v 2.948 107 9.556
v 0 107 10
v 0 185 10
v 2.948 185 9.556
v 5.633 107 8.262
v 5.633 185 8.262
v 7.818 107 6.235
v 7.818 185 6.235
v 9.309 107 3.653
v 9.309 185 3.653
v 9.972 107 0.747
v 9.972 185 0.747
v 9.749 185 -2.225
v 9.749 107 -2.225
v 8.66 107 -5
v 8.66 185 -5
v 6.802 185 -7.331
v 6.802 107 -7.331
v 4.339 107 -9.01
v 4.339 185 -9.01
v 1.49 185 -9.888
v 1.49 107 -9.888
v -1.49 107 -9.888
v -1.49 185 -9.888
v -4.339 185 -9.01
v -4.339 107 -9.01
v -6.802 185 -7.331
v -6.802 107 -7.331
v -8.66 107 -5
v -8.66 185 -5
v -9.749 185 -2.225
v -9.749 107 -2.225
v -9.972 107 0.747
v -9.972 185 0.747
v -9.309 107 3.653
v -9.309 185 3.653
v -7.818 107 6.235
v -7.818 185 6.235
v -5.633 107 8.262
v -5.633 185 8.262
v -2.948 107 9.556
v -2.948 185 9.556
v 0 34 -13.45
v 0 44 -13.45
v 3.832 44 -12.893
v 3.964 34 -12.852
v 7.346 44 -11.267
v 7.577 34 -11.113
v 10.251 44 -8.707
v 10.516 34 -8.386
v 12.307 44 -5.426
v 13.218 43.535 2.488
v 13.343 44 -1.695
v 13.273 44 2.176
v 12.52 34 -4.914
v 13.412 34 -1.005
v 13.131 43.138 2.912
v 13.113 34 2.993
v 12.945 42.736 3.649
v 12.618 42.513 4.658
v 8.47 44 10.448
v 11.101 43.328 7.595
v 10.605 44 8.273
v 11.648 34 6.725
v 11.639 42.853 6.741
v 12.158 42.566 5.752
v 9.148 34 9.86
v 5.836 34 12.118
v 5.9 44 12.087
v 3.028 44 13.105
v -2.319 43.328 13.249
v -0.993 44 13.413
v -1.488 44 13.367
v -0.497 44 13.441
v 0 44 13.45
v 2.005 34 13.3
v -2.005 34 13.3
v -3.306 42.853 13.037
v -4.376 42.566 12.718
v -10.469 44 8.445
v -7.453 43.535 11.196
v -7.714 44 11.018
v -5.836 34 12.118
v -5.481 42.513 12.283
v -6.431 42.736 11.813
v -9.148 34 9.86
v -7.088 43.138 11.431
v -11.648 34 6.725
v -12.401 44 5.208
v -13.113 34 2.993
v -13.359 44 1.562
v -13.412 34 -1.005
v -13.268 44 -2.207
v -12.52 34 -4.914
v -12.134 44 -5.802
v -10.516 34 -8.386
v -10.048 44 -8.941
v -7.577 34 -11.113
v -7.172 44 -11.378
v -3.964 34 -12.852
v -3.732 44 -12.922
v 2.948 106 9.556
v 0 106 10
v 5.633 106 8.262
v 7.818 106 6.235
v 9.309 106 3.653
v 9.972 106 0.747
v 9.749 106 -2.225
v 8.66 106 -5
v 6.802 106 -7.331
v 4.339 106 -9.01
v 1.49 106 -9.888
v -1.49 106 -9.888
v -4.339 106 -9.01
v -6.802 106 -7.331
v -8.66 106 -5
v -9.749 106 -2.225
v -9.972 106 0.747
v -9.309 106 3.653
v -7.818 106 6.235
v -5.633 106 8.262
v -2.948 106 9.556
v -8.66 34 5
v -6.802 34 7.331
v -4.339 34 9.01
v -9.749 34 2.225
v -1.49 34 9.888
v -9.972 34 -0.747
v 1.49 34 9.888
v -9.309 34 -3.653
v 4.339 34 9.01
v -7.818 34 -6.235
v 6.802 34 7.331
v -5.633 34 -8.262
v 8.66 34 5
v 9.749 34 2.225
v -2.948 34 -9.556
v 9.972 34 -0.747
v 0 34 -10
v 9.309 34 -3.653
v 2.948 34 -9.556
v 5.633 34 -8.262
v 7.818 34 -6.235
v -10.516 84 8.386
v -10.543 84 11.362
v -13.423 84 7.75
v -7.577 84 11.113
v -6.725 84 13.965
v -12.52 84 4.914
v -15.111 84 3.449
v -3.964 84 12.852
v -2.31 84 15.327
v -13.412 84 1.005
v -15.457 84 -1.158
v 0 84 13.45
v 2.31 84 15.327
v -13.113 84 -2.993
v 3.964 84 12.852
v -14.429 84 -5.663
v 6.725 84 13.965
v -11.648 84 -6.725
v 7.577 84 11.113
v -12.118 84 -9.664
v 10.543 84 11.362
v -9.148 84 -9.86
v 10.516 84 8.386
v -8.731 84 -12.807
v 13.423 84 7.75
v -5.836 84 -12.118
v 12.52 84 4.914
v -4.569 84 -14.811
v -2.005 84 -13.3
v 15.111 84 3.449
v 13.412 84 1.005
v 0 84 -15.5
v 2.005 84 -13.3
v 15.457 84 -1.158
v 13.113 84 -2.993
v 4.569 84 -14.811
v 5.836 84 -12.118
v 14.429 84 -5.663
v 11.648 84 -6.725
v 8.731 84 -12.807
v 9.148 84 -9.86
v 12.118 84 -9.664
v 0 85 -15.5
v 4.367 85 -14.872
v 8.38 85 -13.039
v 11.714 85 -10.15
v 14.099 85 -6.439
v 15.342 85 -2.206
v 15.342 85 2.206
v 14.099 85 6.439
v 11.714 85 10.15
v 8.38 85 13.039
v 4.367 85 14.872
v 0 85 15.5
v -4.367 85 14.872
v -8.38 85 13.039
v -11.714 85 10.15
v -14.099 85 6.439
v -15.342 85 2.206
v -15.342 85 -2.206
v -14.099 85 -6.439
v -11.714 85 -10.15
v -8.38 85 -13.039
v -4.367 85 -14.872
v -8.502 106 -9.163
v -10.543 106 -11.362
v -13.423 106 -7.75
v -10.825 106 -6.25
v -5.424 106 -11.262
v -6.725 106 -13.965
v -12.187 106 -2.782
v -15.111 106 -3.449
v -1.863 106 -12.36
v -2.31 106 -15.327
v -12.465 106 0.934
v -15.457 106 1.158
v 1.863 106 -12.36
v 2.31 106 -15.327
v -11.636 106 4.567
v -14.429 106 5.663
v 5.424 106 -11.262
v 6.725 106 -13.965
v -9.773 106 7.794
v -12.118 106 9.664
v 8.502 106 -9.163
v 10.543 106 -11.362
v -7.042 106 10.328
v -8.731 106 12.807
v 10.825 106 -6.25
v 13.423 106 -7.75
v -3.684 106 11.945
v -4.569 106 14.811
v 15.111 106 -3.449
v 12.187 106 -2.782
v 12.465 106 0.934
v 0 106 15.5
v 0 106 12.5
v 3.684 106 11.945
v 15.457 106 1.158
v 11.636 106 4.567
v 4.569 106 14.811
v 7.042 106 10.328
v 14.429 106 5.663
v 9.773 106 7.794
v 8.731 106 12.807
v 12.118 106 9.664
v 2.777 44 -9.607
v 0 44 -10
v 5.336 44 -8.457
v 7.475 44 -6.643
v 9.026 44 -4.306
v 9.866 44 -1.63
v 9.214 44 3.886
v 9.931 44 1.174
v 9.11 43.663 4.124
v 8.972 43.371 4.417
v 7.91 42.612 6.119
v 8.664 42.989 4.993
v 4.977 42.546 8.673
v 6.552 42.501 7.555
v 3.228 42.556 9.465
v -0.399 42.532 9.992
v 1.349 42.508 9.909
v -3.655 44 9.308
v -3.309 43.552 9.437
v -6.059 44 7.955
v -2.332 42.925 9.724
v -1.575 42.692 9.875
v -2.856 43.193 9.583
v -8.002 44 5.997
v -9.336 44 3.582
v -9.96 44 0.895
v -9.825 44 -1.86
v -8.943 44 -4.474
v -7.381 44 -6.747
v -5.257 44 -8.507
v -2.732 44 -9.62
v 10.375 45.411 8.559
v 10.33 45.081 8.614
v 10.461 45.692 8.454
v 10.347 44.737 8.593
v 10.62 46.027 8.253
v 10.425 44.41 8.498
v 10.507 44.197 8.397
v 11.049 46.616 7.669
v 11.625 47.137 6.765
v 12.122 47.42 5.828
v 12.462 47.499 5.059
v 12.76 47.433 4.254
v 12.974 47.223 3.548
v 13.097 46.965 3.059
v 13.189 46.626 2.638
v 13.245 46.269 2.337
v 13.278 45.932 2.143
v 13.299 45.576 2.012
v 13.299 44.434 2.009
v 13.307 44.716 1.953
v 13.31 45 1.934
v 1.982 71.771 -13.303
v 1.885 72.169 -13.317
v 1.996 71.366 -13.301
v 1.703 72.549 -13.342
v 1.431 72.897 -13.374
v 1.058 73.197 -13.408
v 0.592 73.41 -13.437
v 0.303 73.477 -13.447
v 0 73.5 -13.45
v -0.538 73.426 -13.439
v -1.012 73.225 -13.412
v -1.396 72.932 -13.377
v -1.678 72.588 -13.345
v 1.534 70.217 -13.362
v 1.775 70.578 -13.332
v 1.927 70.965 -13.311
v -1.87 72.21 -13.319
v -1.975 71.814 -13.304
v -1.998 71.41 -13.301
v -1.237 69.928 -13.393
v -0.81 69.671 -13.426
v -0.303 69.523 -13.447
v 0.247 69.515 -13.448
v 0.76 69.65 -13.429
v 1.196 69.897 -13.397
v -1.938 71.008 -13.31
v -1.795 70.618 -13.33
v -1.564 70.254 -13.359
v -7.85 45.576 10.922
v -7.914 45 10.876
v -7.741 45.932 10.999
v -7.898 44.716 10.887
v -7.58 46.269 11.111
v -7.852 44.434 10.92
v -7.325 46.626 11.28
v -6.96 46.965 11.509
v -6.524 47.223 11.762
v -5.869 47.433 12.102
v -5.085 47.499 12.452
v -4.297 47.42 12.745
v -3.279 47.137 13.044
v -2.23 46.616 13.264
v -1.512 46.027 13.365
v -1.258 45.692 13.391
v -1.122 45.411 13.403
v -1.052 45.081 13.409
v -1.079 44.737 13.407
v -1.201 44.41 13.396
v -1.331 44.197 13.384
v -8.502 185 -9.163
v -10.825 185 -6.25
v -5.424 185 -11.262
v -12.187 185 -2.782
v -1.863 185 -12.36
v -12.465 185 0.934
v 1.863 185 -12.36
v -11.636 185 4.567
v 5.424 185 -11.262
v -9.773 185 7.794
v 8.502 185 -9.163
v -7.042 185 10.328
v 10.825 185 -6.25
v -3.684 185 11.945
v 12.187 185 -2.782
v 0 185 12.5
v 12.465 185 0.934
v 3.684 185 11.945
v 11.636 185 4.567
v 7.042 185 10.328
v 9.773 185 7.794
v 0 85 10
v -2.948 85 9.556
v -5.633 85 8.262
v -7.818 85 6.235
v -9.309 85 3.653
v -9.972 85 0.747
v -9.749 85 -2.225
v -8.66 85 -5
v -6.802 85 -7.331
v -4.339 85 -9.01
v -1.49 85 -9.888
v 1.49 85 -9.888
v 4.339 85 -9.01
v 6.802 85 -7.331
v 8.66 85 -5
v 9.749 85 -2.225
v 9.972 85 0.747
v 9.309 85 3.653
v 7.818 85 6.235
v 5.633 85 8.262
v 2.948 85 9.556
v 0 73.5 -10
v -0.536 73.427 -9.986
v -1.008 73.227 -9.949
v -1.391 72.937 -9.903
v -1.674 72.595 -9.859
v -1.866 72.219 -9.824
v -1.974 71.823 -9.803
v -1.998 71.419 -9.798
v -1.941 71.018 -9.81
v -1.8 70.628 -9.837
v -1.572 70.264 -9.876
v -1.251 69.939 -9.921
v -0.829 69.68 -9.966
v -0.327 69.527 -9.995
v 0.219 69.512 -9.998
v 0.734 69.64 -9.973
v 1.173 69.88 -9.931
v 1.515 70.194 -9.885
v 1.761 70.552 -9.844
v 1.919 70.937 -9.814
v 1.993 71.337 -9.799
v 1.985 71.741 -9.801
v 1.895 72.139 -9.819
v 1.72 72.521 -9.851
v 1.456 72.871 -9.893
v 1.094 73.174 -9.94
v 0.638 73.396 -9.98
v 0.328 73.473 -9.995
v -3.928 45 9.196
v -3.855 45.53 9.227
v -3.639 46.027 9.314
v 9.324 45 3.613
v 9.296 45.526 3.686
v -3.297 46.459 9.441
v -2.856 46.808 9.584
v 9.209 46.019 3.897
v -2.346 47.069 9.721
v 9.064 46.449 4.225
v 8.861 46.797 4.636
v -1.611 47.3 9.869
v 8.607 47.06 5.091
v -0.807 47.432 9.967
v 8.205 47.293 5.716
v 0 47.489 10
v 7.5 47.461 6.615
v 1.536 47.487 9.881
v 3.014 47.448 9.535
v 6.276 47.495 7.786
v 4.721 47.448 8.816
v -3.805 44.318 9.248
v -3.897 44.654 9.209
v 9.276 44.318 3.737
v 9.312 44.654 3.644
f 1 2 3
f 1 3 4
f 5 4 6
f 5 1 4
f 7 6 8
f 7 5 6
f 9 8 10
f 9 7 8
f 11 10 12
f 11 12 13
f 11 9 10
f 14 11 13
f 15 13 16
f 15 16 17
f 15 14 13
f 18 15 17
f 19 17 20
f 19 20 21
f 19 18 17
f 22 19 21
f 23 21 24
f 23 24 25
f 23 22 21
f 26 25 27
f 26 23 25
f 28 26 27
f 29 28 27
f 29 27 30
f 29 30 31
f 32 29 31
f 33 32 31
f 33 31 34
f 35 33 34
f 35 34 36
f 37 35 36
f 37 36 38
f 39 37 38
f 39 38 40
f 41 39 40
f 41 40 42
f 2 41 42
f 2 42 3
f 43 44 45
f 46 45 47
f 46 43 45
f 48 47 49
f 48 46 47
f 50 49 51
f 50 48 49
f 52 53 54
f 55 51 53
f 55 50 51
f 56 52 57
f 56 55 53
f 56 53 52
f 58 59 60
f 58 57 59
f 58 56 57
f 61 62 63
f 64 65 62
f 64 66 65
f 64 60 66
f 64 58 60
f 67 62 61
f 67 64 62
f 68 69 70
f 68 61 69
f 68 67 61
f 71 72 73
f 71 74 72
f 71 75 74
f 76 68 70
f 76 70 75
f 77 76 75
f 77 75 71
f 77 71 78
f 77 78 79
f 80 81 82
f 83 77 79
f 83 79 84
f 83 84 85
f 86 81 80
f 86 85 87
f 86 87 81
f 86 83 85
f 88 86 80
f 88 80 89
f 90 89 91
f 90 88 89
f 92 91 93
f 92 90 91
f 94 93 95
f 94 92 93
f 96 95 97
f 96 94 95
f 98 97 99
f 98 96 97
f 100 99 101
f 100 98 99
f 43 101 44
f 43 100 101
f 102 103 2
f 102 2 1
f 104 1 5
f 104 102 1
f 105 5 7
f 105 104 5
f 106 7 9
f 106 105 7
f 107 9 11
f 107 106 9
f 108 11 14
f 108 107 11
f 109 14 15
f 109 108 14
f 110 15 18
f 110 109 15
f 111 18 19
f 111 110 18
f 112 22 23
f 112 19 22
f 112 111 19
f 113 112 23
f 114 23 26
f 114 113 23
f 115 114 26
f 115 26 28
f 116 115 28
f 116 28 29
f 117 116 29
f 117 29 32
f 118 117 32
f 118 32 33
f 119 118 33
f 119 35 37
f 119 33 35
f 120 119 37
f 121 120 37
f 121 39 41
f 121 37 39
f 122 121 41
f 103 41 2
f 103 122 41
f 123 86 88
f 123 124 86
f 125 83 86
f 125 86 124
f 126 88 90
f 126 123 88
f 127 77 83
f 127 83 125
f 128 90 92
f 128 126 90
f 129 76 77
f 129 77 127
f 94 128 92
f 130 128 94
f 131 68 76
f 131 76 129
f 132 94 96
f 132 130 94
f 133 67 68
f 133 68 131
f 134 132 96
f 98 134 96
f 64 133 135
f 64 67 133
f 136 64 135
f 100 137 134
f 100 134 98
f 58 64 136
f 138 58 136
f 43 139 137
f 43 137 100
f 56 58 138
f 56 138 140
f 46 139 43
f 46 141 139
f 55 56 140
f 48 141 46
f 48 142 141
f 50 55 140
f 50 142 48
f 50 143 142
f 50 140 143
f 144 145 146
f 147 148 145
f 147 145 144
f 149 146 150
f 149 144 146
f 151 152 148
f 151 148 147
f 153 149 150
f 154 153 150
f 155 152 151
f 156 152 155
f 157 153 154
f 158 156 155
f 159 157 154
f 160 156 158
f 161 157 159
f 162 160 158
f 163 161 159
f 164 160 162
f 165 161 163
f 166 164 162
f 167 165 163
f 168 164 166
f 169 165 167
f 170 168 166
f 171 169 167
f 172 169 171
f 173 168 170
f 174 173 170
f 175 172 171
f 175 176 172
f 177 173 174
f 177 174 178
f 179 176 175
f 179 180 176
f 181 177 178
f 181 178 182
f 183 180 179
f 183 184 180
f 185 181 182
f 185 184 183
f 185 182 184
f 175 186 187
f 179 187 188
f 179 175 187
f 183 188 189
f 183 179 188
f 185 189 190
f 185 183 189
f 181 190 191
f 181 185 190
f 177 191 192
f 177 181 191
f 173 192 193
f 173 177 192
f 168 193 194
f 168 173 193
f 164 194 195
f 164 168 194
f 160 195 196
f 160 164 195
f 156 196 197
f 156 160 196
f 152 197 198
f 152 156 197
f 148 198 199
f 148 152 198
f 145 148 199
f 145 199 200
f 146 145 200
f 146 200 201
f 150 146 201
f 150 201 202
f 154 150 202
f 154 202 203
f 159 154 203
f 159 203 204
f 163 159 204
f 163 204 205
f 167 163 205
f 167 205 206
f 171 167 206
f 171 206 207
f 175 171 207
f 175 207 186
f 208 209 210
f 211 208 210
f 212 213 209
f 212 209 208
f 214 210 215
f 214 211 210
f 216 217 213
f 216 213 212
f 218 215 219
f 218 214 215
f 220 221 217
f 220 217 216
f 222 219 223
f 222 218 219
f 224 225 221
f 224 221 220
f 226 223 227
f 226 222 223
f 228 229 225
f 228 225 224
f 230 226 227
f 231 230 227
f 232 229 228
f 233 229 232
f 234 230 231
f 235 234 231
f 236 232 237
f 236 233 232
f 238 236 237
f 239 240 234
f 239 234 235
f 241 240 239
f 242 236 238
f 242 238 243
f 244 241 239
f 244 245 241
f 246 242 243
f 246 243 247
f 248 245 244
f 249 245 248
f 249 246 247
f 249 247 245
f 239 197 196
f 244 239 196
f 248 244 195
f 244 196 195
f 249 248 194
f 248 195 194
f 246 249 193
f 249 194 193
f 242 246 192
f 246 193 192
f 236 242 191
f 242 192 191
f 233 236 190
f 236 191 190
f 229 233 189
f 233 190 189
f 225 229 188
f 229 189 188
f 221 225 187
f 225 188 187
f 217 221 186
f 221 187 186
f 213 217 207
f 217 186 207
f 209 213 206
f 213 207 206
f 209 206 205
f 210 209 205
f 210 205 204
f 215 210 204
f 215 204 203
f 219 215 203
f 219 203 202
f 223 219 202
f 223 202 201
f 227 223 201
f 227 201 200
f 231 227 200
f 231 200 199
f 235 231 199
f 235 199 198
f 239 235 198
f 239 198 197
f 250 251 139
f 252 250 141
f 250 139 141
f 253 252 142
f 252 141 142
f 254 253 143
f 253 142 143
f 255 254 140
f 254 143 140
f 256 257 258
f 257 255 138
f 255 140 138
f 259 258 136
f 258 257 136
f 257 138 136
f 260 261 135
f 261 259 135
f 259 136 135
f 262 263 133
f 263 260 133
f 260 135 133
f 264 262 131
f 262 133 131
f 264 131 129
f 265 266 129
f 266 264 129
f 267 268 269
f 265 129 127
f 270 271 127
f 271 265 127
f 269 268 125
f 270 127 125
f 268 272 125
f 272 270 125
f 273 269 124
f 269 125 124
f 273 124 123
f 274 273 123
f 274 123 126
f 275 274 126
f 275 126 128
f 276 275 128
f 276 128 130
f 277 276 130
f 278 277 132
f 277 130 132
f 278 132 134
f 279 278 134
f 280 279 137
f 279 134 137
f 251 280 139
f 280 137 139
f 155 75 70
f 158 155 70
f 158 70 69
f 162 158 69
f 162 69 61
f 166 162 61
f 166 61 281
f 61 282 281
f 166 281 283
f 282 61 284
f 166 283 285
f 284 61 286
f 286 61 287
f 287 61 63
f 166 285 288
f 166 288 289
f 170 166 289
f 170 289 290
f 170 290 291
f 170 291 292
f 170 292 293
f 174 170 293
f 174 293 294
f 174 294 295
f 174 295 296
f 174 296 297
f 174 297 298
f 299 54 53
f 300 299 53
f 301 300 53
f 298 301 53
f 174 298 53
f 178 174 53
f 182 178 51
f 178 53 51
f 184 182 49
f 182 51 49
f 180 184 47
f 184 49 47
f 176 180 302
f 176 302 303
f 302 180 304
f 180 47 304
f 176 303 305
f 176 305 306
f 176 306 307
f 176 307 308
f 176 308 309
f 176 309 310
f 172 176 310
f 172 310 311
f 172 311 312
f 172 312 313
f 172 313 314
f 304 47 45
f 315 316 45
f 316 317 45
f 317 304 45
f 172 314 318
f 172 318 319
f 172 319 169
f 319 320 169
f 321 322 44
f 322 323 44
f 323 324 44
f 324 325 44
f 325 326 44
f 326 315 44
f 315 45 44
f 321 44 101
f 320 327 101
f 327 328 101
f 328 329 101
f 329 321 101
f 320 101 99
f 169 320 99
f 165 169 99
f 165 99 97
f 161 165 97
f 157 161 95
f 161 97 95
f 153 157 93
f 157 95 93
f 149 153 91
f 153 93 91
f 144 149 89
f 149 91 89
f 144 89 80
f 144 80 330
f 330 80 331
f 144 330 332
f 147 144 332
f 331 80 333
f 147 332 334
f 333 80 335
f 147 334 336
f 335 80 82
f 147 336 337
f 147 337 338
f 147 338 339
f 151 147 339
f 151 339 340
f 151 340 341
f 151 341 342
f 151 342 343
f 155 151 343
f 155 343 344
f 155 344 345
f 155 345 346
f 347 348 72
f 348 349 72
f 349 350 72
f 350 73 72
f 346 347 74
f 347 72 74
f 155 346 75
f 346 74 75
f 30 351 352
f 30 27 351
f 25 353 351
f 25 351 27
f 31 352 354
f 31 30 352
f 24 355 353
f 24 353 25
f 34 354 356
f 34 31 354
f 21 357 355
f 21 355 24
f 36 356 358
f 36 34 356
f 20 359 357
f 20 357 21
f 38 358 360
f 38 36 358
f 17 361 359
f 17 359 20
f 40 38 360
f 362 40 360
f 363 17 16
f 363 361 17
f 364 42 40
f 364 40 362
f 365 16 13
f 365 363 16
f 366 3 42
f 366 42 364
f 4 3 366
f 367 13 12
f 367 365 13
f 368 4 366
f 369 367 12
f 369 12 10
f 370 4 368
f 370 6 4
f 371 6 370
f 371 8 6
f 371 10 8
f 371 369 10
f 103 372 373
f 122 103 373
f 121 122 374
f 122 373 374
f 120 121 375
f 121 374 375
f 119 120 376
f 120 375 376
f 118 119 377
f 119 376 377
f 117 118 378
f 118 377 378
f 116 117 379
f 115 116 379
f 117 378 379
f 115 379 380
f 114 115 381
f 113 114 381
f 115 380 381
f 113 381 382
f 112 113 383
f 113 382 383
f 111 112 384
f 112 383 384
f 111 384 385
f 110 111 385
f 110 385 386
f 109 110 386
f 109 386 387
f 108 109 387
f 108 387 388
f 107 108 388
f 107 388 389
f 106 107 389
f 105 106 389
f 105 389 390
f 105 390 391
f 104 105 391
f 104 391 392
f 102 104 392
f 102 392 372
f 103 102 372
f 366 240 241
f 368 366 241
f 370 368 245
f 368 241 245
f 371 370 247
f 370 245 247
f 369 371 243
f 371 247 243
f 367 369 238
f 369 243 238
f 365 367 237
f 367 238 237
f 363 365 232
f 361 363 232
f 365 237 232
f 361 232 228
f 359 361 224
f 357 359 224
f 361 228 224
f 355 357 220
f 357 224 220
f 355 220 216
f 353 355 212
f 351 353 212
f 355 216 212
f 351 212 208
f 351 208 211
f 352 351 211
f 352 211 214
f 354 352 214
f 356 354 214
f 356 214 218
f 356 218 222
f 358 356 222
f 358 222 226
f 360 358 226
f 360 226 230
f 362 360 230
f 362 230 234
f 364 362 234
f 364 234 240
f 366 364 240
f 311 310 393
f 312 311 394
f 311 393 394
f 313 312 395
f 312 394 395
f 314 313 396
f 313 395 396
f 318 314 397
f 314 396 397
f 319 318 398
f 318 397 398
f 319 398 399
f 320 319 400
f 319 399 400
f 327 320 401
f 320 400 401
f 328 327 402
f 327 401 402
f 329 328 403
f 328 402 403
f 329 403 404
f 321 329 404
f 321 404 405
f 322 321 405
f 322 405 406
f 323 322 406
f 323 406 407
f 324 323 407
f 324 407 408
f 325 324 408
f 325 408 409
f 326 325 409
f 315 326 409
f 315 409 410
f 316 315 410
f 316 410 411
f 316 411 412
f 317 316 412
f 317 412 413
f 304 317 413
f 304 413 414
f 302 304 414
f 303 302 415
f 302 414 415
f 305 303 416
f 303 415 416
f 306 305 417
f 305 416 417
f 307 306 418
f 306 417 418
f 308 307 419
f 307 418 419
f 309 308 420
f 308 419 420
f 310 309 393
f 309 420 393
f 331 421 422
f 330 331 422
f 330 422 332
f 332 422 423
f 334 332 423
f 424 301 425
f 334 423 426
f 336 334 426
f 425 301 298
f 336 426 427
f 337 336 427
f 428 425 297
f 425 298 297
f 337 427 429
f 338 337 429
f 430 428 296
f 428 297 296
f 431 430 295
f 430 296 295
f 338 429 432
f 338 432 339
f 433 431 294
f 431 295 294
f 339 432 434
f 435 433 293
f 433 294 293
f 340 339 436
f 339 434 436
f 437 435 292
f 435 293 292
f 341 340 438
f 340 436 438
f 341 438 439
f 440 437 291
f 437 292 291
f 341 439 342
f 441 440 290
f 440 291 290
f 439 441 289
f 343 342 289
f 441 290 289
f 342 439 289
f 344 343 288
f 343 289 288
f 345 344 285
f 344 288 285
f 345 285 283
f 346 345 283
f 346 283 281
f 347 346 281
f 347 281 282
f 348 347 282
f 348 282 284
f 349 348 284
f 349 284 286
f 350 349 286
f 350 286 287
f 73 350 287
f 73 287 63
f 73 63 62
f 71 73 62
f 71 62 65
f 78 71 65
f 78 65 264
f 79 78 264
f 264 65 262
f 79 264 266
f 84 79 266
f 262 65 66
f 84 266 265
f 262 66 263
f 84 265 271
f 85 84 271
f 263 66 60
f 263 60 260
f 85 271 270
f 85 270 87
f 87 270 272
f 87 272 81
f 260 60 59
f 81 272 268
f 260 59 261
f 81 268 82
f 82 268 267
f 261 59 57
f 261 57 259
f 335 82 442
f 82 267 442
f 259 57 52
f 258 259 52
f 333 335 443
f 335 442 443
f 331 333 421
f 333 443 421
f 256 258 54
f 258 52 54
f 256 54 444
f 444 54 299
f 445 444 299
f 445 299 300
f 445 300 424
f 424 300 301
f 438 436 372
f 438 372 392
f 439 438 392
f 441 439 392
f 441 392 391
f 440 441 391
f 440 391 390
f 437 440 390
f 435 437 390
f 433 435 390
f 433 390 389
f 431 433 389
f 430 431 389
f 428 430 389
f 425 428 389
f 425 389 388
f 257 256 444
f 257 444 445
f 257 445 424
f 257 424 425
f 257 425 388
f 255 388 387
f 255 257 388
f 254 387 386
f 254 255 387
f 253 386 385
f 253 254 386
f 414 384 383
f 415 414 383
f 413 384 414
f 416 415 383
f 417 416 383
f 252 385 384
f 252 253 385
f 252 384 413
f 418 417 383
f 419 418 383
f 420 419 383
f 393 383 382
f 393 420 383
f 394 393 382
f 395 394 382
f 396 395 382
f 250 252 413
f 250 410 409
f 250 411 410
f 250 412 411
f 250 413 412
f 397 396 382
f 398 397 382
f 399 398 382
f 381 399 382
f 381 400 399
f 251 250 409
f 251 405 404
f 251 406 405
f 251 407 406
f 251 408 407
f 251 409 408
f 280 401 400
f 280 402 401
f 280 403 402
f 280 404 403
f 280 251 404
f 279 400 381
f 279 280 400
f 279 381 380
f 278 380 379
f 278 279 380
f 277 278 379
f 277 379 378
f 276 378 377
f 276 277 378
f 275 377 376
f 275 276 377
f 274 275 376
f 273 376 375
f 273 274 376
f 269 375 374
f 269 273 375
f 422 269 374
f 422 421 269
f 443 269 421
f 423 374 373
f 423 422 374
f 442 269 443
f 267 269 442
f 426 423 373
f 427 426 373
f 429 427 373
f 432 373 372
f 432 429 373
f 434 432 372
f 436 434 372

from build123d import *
from build123d.topology import SkipClean

# Parameters (mm, degrees)
SKETCH1_R                = 13.45
SKETCH1_R_2              = 10
BOSS_EXTRUDE1_DEPTH      = 100
BOSS_EXTRUDE2_DEPTH      = 85
BOSS_EXTRUDE2_DEPTH_BACK = 4
SKETCH6_R                = 12.5
SKETCH6_R_2              = 10
BOSS_EXTRUDE3_START      = -84
SKETCH7_R                = 15.5
SKETCH7_R_2              = 10
BOSS_EXTRUDE3_DEPTH      = 1
CUT_EXTRUDE1_DEPTH       = 187.294122291
CUT_EXTRUDE1_DEPTH_BACK  = 187.294122291
SKETCH11_W               = 35.010034018
SKETCH11_H               = 2.4
CUT_EXTRUDE3_DEPTH       = 187.294122291
CUT_EXTRUDE3_DEPTH_BACK  = 187.294122291
SKETCH13_W               = 32.559051685
SKETCH13_H               = 42.8
SKETCH14_R               = 15.5
BOSS_EXTRUDE4_DEPTH      = 21
SKETCH15_R               = 10
CUT_EXTRUDE4_DEPTH       = 22
BOSS_EXTRUDE5_START      = 10
SKETCH17_R               = 13.45
SKETCH17_R_2             = 10
BOSS_EXTRUDE5_DEPTH      = 10
SKETCH18_R               = 2.5
CUT_EXTRUDE5_DEPTH       = 54
SKETCH20_R               = 2
CUT_EXTRUDE6_DEPTH       = 22


with BuildPart() as part:
    # Sketch1 → Boss-Extrude1 (new body)
    with BuildSketch(Plane(origin=(0, 0, 0), x_dir=(1, 0, 0), z_dir=(0, 1, 0))):
        with Locations(Location((0, 0, 0), (0, 0, 270))):
            Circle(SKETCH1_R)
        with Locations(Location((0, 0, 0), (0, 0, 270))):
            Circle(SKETCH1_R_2, mode=Mode.SUBTRACT)
    extrude(amount=BOSS_EXTRUDE1_DEPTH)

    # Sketch6 → Boss-Extrude2 (add, two sides: drawn at the far end of the back side and taken through both)
    with BuildSketch(Plane(origin=(0, 100, 0), x_dir=(1, 0, 0), z_dir=(0, 1, 0)).offset(-BOSS_EXTRUDE2_DEPTH_BACK)):
        with Locations(Location((0, 0, 0), (0, 0, 270))):
            Circle(SKETCH6_R)
        with Locations(Location((0, 0, 0), (0, 0, 270))):
            Circle(SKETCH6_R_2, mode=Mode.SUBTRACT)
    extrude(amount=BOSS_EXTRUDE2_DEPTH + BOSS_EXTRUDE2_DEPTH_BACK)

    # Sketch7 → Boss-Extrude3 (add)
    with BuildSketch(Plane.XZ.offset(BOSS_EXTRUDE3_START)):
        with Locations(Location((0, 0, 0), (0, 0, 270))):
            Circle(SKETCH7_R)
        with Locations(Location((0, 0, 0), (0, 0, 90))):
            Circle(SKETCH7_R_2, mode=Mode.SUBTRACT)
    extrude(amount=-BOSS_EXTRUDE3_DEPTH)

    # Sketch11 → Cut-Extrude1 (cut, two sides: drawn at the far end of the back side and taken through both)
    with BuildSketch(Plane(origin=(0, 0, 0), x_dir=(0, 0, -1), z_dir=(1, 0, 0)).offset(-CUT_EXTRUDE1_DEPTH_BACK)):
        Rectangle(SKETCH11_W, SKETCH11_H)
    extrude(amount=CUT_EXTRUDE1_DEPTH + CUT_EXTRUDE1_DEPTH_BACK, mode=Mode.SUBTRACT)

    # Sketch13 → Cut-Extrude3 (cut, two sides: drawn at the far end of the back side and taken through both)
    with BuildSketch(Plane.XY.offset(-CUT_EXTRUDE3_DEPTH_BACK)):
        with Locations((2.829525842, 22.6)):
            Rectangle(SKETCH13_W, SKETCH13_H)
    extrude(amount=CUT_EXTRUDE3_DEPTH + CUT_EXTRUDE3_DEPTH_BACK, mode=Mode.SUBTRACT)

    # Sketch14 → Boss-Extrude4 (add)
    with BuildSketch(Plane(origin=(0, 85, 0), x_dir=(1, 0, 0), z_dir=(0, 1, 0))):
        with Locations(Location((0, 0, 0), (0, 0, 270))):
            Circle(SKETCH14_R)
    extrude(amount=BOSS_EXTRUDE4_DEPTH)

    # Sketch15 → Cut-Extrude4 (cut)
    with BuildSketch(Plane.XZ.offset(-85)):
        with Locations(Location((0, 0, 0), (0, 0, 90))):
            Circle(SKETCH15_R)
    extrude(amount=-CUT_EXTRUDE4_DEPTH, mode=Mode.SUBTRACT)

    # Sketch17 → Boss-Extrude5 (add)
    with BuildSketch(Plane.XZ.offset(-44).offset(BOSS_EXTRUDE5_START)):
        with Locations(Location((0, 0, 0), (0, 0, 270))):
            Circle(SKETCH17_R)
        with Locations(Location((0, 0, 0), (0, 0, 270))):
            Circle(SKETCH17_R_2, mode=Mode.SUBTRACT)
    extrude(amount=-BOSS_EXTRUDE5_DEPTH)

    # Sketch18 → Cut-Extrude5 (cut)
    with SkipClean():  # the faces are left unmerged after this step: merging them gives an invalid solid
        with BuildSketch(Plane(origin=(35.019010809, 0, -14.753605728), x_dir=(-0.38825278231327914, 1.212401304802914e-15, -0.9215529160205601), z_dir=(0.9215529160205602, -2.877743595734803e-15, -0.3882527823132792))):
            with Locations((-9.45, 45)):
                Circle(SKETCH18_R)
        extrude(amount=-CUT_EXTRUDE5_DEPTH, mode=Mode.SUBTRACT)

    # Sketch20 → Cut-Extrude6 (cut)
    with BuildSketch(Plane.XY):
        with Locations(Location((0, 71.5, 0), (0, 0, 90))):
            Circle(SKETCH20_R)
    extrude(amount=-CUT_EXTRUDE6_DEPTH, mode=Mode.SUBTRACT)


solid = part.part
